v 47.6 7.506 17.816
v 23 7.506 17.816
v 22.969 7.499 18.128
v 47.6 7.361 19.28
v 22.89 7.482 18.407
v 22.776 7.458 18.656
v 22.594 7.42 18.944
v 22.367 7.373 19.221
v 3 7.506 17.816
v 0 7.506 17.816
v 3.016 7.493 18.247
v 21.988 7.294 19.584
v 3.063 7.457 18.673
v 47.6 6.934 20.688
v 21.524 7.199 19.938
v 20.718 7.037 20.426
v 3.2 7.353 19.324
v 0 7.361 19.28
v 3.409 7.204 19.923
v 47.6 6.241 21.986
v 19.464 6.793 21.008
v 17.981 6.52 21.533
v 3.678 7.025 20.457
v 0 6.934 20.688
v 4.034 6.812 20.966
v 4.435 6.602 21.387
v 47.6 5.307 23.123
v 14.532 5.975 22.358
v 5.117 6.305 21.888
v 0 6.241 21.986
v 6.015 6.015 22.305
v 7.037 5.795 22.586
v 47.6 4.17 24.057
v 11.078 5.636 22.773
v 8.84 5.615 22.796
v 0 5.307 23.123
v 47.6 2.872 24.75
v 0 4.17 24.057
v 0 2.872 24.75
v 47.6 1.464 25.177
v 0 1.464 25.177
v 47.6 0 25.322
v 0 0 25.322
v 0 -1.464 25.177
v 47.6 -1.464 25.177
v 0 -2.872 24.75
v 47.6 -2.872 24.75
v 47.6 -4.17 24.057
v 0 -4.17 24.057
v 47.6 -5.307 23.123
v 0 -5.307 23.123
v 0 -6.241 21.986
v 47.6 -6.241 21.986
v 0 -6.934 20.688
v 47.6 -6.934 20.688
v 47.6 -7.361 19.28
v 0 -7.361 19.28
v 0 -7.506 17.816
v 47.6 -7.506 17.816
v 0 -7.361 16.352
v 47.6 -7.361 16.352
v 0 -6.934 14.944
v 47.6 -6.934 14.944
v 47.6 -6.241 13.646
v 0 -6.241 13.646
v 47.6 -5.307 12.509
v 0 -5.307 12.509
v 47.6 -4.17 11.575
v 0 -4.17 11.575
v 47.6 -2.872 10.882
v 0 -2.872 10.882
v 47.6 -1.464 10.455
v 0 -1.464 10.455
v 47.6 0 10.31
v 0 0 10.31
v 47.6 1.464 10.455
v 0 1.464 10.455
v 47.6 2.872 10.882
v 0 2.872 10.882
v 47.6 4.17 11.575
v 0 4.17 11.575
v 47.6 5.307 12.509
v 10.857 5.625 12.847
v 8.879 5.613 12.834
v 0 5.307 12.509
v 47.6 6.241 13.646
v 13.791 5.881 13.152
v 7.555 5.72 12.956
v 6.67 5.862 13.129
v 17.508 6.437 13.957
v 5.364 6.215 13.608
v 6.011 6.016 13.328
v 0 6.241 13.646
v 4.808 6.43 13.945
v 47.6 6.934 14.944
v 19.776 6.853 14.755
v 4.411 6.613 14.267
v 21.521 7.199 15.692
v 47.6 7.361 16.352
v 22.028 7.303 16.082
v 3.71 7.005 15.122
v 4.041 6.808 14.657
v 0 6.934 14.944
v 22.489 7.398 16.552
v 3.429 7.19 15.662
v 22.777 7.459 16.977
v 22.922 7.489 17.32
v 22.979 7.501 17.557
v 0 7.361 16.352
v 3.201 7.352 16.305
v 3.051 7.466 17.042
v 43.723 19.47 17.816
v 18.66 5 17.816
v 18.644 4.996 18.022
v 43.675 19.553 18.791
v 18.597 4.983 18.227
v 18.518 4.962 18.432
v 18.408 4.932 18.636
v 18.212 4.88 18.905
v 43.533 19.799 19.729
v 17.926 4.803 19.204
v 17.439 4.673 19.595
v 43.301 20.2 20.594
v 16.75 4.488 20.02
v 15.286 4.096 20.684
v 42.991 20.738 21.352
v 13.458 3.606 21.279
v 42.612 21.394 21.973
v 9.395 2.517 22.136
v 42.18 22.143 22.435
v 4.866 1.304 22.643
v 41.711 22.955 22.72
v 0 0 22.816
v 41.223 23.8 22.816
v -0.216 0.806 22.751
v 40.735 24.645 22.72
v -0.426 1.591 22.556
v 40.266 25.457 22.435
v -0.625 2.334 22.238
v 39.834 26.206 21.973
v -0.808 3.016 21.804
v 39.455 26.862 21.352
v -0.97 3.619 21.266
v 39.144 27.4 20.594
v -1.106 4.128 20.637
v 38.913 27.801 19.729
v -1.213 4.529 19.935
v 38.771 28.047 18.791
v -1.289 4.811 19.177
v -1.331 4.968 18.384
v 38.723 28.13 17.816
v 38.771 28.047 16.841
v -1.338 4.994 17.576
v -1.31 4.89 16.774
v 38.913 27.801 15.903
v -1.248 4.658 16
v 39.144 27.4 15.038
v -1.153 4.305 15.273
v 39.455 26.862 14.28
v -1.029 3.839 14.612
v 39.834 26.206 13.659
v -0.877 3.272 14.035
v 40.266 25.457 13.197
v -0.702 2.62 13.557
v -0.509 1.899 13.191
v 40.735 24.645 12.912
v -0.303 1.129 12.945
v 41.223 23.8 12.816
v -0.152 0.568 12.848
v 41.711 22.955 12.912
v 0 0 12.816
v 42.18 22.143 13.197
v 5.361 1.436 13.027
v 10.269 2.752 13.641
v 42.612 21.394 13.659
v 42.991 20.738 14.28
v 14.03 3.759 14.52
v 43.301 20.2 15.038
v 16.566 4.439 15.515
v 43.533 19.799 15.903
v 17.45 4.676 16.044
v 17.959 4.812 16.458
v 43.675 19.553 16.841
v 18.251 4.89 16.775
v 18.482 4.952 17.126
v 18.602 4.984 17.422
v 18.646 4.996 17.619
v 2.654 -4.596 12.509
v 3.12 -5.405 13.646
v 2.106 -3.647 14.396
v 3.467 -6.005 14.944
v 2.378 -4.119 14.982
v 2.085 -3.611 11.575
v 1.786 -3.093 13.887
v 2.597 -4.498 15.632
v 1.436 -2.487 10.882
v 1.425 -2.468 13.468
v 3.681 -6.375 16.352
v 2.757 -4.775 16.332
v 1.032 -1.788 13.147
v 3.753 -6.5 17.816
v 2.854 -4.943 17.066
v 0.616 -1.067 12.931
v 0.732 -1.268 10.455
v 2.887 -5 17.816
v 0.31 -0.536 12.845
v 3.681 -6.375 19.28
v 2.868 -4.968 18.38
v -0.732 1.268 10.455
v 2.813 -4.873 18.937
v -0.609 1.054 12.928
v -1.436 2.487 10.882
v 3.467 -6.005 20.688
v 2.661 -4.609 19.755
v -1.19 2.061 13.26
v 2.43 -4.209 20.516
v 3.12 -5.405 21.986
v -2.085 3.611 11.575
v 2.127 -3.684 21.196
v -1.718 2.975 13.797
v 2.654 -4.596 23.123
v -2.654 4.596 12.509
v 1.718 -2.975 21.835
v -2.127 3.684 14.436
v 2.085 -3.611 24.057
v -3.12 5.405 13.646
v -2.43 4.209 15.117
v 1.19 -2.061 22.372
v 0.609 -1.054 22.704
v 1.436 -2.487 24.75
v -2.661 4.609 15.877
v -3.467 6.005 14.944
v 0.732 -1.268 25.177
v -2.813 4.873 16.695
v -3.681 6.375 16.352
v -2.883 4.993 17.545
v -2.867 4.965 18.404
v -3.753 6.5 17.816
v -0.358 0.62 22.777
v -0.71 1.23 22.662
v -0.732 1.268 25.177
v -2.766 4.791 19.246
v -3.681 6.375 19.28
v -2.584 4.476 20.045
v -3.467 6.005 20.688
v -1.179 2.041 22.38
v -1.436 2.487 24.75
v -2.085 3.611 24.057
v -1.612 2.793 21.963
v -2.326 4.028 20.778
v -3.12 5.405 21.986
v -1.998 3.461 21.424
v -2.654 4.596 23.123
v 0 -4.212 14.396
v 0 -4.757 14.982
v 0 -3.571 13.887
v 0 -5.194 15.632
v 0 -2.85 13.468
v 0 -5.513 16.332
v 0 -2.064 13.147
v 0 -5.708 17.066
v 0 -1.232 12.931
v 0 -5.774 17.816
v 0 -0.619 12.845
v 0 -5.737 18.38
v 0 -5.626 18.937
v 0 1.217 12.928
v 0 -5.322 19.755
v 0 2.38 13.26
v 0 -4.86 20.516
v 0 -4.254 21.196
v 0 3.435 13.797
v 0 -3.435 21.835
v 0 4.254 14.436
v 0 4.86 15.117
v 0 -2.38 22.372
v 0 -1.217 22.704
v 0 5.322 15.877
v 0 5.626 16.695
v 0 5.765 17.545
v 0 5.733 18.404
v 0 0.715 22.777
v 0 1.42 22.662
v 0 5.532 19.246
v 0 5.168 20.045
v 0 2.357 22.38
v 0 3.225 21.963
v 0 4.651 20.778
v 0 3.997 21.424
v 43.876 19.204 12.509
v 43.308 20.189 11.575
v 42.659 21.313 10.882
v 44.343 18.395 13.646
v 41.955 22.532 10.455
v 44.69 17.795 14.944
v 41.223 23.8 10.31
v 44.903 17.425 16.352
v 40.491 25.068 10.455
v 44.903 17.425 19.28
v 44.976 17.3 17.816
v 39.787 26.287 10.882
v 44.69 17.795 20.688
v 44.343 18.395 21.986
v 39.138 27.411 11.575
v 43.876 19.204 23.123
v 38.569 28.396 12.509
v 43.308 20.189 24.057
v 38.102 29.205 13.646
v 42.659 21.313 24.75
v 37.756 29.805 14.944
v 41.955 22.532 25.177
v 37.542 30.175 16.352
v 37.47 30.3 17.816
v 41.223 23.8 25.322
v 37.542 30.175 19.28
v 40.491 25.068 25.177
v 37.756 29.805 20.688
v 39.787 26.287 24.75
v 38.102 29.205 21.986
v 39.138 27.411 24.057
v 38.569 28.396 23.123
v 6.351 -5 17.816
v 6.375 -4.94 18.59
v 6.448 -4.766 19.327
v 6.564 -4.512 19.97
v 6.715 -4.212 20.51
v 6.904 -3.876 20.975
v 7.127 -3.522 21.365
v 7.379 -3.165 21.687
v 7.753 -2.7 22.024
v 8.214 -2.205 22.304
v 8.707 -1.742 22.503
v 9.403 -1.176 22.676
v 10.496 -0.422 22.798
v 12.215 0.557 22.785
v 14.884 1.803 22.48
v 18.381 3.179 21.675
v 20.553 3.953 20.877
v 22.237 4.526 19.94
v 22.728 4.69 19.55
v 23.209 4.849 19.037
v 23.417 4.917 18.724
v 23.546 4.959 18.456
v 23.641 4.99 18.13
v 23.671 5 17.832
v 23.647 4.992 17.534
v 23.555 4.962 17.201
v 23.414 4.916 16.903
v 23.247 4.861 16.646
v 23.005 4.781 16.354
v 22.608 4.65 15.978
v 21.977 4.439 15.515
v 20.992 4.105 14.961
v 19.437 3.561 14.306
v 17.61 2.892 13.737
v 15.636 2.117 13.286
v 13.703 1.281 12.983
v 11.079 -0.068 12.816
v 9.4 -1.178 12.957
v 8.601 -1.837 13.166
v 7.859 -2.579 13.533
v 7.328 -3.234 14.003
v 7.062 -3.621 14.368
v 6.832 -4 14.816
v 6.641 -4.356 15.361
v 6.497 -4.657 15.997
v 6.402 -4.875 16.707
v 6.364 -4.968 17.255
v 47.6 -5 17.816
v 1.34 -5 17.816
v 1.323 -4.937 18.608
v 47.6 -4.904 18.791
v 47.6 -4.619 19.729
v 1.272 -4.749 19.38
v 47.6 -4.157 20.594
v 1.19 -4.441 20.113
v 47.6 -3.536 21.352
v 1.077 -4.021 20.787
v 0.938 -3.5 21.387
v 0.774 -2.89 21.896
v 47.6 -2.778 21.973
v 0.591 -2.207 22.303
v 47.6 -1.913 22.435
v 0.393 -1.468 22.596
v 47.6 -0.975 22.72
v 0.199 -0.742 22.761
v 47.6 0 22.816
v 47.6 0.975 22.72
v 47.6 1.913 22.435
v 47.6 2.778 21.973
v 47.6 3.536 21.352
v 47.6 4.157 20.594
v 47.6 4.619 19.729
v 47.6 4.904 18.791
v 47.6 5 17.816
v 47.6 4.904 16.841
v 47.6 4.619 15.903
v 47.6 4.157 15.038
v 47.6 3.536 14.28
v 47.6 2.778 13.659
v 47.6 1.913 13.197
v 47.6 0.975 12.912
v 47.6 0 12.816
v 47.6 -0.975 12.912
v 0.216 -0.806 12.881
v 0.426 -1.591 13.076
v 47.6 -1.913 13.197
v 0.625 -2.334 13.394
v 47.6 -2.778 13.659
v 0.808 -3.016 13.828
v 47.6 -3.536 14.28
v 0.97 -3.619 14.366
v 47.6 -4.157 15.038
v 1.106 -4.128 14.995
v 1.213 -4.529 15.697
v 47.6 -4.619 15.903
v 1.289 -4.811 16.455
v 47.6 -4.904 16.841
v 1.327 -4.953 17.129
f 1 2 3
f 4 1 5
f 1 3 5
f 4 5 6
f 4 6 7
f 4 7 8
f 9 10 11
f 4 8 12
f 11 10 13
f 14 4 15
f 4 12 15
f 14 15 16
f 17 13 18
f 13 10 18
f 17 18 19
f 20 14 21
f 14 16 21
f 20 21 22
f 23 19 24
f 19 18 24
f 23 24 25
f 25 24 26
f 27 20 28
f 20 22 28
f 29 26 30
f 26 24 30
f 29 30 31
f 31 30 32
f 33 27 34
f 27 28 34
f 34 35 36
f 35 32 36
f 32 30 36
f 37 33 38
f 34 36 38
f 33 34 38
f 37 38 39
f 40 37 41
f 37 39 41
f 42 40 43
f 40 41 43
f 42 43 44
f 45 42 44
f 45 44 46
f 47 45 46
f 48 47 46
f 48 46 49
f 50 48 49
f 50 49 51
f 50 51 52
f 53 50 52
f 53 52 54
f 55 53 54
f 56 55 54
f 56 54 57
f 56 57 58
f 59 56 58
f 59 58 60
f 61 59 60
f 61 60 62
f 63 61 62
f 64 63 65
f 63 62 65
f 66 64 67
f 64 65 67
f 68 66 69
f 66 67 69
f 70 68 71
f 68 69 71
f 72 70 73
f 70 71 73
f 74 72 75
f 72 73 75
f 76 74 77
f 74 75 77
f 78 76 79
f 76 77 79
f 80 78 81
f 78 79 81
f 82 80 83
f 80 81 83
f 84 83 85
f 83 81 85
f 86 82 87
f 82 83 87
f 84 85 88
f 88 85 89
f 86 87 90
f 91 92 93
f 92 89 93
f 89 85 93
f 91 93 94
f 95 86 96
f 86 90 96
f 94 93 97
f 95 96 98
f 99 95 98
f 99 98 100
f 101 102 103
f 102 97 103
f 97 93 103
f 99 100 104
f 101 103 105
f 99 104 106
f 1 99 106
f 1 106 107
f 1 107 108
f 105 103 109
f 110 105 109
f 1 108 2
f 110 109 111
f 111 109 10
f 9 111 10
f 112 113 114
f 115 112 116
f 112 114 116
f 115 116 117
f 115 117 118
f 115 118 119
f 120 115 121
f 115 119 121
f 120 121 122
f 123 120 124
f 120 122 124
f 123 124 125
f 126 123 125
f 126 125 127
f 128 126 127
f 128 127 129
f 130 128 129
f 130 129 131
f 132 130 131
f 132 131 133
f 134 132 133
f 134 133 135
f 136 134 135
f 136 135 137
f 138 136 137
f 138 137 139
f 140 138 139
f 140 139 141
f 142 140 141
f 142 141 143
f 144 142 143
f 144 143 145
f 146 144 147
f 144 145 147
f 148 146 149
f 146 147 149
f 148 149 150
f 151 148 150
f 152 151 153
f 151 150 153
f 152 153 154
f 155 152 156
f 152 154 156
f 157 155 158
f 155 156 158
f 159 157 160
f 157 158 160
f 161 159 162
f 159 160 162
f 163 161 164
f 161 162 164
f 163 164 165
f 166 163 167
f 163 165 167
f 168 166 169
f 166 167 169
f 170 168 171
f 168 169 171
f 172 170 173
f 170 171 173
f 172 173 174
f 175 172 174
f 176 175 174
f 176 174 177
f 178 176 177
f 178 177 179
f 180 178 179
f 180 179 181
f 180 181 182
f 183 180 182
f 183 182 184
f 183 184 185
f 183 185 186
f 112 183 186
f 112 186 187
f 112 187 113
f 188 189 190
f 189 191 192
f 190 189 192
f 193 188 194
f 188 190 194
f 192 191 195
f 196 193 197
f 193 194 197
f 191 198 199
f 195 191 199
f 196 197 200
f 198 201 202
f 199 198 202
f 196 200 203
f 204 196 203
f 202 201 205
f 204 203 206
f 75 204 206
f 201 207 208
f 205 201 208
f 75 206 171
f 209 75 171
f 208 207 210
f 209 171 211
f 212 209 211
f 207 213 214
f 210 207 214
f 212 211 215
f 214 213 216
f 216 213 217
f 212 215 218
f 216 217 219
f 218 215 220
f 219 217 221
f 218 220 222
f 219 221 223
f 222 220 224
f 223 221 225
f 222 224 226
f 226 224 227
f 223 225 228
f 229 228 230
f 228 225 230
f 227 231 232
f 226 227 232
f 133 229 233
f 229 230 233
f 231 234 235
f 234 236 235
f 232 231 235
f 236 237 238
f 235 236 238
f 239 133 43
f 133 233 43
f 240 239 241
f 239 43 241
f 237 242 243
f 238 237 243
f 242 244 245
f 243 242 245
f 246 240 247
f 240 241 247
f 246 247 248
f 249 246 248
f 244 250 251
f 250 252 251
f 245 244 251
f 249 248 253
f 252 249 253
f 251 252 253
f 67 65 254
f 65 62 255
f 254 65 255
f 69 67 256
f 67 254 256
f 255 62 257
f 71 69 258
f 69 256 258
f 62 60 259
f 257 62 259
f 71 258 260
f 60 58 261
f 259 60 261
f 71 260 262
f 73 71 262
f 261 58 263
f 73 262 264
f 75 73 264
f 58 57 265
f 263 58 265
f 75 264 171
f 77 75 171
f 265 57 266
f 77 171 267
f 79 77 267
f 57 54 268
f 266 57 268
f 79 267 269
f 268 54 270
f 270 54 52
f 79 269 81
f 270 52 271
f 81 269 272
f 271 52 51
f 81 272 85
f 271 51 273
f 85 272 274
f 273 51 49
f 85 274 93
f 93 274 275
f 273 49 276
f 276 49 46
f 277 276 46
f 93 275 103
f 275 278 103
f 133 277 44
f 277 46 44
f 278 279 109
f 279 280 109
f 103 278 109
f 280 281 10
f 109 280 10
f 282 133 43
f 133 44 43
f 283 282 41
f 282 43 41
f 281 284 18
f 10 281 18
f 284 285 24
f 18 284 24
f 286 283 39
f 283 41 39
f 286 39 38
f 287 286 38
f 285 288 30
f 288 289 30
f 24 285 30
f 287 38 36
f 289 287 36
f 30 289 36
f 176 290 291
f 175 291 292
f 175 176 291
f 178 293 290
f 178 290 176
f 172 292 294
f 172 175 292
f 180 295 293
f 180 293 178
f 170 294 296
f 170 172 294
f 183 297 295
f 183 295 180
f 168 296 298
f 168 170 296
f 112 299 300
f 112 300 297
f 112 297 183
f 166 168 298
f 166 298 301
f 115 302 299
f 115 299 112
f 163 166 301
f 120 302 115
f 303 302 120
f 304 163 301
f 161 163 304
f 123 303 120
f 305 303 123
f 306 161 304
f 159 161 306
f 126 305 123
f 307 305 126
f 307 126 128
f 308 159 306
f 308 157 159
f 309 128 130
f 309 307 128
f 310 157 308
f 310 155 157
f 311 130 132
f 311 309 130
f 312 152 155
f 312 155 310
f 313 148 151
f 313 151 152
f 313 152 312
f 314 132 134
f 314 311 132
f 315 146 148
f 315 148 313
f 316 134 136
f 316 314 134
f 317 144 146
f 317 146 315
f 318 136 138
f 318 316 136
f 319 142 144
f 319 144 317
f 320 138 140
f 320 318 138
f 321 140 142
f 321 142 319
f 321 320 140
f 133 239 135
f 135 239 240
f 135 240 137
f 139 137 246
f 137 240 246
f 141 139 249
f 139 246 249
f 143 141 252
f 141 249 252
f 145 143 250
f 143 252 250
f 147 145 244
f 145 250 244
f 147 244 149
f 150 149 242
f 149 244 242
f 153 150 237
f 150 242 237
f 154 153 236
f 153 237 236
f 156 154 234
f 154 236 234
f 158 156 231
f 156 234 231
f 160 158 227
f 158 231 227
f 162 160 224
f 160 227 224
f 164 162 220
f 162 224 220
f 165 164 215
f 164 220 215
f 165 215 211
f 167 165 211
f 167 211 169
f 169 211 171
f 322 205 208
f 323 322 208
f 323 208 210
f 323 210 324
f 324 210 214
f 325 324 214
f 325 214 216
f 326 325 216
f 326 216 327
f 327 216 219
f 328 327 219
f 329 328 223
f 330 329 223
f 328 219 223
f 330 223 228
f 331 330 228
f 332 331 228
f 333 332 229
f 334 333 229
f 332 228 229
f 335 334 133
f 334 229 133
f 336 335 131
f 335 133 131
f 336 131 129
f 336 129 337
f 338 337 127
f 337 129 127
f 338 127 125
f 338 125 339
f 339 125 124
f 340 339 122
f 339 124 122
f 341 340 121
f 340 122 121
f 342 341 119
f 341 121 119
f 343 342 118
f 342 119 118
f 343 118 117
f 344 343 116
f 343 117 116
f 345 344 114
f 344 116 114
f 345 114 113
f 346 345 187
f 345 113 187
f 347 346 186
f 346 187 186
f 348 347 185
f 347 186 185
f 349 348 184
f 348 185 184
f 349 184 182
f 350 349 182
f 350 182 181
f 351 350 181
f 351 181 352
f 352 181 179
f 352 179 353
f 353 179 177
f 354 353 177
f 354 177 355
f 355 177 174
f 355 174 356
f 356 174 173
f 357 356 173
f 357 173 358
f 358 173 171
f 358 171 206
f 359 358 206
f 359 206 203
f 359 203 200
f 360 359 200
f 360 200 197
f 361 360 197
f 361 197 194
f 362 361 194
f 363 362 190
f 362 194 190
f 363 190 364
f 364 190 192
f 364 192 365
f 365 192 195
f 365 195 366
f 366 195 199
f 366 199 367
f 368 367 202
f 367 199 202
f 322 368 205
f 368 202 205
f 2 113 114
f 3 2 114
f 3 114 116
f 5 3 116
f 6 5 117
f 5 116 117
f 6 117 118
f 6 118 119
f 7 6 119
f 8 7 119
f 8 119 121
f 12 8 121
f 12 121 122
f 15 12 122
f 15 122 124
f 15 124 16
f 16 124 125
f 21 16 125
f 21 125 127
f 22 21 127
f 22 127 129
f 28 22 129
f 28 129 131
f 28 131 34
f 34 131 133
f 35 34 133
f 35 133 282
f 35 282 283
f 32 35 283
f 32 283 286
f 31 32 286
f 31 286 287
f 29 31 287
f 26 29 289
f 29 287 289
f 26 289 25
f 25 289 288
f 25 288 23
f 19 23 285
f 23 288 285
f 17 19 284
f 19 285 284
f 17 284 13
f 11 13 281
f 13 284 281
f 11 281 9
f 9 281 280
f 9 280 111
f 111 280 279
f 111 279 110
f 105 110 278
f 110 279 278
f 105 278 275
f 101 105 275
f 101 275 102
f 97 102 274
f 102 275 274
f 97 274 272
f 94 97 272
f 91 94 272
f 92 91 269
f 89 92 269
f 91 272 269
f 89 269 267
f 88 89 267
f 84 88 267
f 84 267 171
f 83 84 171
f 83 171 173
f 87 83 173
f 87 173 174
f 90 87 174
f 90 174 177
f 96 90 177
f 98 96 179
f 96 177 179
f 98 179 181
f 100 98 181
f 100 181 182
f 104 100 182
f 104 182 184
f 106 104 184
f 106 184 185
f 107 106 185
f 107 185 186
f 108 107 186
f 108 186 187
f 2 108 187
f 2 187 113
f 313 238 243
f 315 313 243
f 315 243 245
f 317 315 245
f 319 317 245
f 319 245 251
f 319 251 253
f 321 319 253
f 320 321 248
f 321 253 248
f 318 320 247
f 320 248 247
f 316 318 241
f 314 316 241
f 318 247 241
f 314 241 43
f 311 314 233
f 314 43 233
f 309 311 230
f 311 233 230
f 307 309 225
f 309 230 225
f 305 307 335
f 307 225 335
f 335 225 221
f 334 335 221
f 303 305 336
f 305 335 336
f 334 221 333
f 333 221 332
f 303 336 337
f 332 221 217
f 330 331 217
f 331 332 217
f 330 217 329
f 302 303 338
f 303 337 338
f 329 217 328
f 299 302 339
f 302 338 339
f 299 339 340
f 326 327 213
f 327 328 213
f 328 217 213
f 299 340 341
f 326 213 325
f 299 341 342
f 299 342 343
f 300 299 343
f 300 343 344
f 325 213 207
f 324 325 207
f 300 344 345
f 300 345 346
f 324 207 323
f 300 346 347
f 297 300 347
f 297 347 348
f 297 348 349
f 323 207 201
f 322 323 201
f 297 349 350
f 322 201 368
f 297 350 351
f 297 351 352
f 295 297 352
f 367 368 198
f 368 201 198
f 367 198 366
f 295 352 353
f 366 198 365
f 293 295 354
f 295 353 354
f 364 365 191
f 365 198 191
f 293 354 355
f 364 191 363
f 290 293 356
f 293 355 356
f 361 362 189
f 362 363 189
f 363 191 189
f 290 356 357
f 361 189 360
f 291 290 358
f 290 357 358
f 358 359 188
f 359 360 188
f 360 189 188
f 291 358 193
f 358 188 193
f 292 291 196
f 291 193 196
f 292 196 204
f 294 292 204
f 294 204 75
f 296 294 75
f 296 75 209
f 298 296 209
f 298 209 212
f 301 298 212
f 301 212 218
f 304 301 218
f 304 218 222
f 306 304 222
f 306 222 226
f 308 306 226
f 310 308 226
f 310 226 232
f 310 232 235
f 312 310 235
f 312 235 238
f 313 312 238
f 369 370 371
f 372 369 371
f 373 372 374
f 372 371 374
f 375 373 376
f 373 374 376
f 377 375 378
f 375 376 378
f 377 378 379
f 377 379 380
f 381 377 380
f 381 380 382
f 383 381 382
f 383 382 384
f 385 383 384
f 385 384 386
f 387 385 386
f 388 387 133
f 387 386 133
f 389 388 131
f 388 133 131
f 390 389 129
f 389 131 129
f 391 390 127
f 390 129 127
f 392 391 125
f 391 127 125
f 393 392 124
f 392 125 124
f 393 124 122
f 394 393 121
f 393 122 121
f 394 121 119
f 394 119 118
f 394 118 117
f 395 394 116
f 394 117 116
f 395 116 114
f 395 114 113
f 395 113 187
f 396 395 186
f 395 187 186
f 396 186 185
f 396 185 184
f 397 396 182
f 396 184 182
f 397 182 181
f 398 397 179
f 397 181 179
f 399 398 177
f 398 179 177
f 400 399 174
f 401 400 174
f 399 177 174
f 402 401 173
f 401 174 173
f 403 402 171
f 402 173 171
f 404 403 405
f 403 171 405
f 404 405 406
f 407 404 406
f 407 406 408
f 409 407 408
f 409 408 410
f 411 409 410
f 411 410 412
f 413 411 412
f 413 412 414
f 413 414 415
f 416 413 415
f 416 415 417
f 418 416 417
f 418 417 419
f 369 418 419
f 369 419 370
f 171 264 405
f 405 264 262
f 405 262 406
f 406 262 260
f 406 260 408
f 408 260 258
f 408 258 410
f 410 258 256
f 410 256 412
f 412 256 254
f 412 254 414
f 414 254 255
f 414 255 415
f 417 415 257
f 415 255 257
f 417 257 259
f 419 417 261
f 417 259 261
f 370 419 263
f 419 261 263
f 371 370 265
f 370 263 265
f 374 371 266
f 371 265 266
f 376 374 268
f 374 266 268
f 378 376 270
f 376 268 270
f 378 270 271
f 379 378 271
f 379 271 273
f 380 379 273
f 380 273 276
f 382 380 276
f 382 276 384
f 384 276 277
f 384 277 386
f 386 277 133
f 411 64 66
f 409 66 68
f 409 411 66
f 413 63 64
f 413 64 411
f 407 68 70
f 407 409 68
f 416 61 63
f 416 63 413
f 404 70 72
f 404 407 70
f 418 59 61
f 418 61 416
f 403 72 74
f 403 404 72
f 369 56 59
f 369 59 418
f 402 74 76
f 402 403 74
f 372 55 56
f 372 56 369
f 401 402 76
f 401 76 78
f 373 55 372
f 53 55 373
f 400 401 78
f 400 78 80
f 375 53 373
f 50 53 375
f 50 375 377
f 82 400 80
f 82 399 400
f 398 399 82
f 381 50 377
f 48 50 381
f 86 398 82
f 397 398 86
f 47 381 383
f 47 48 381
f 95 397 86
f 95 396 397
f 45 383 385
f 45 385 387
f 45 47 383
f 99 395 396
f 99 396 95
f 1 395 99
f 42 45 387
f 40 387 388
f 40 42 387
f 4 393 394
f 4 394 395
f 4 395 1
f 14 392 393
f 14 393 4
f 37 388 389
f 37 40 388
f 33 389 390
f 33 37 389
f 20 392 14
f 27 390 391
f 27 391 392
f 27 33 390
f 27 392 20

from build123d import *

# Parameters (mm, degrees)
F0_R         = 7.5055473268
F1_DEPTH     = 47.6
F3_ANGLE     = 30
F6_D         = 10
F6_2_D       = 10
F6_ON_F4_D   = 10
F6_ON_F4_2_D = 10


with BuildPart() as f1:
    # F0 (on Right) → F1 (new body)
    with BuildSketch(Plane.YZ):
        with Locations((0, 17.8160220385)):
            Circle(F0_R)
    extrude(amount=F1_DEPTH)


with BuildPart() as f3_1:
    # F3: copy of F1
    add(f1.part.rotate(Axis((0, 0, 19.100047648), (0, 0, 1)), F3_ANGLE))

    # F6#2 (through all)
    with Locations(Plane(origin=(41.2228092201, 23.8, 0), x_dir=(-0.5, 0.8660254038, 0), z_dir=(0.8660254038, 0.5, 0))):
        with Locations((0, 17.8160220385)):
            Hole(F6_2_D / 2)

    # F6 on F4#2 (through all)
    with Locations(Plane.YZ.offset(47.6)):
        with Locations((0, 17.8160220385)):
            Hole(F6_ON_F4_2_D / 2)


with BuildPart() as f1_1:
    add(f1.part)

    # F6 (through all)
    with Locations(Plane(origin=(41.2228092201, 23.8, 0), x_dir=(-0.5, 0.8660254038, 0), z_dir=(0.8660254038, 0.5, 0))):
        with Locations((0, 17.8160220385)):
            Hole(F6_D / 2)

    # F6 on F4 (through all)
    with Locations(Plane.YZ.offset(47.6)):
        with Locations((0, 17.8160220385)):
            Hole(F6_ON_F4_D / 2)


solid = Compound([f3_1.part, f1_1.part])
